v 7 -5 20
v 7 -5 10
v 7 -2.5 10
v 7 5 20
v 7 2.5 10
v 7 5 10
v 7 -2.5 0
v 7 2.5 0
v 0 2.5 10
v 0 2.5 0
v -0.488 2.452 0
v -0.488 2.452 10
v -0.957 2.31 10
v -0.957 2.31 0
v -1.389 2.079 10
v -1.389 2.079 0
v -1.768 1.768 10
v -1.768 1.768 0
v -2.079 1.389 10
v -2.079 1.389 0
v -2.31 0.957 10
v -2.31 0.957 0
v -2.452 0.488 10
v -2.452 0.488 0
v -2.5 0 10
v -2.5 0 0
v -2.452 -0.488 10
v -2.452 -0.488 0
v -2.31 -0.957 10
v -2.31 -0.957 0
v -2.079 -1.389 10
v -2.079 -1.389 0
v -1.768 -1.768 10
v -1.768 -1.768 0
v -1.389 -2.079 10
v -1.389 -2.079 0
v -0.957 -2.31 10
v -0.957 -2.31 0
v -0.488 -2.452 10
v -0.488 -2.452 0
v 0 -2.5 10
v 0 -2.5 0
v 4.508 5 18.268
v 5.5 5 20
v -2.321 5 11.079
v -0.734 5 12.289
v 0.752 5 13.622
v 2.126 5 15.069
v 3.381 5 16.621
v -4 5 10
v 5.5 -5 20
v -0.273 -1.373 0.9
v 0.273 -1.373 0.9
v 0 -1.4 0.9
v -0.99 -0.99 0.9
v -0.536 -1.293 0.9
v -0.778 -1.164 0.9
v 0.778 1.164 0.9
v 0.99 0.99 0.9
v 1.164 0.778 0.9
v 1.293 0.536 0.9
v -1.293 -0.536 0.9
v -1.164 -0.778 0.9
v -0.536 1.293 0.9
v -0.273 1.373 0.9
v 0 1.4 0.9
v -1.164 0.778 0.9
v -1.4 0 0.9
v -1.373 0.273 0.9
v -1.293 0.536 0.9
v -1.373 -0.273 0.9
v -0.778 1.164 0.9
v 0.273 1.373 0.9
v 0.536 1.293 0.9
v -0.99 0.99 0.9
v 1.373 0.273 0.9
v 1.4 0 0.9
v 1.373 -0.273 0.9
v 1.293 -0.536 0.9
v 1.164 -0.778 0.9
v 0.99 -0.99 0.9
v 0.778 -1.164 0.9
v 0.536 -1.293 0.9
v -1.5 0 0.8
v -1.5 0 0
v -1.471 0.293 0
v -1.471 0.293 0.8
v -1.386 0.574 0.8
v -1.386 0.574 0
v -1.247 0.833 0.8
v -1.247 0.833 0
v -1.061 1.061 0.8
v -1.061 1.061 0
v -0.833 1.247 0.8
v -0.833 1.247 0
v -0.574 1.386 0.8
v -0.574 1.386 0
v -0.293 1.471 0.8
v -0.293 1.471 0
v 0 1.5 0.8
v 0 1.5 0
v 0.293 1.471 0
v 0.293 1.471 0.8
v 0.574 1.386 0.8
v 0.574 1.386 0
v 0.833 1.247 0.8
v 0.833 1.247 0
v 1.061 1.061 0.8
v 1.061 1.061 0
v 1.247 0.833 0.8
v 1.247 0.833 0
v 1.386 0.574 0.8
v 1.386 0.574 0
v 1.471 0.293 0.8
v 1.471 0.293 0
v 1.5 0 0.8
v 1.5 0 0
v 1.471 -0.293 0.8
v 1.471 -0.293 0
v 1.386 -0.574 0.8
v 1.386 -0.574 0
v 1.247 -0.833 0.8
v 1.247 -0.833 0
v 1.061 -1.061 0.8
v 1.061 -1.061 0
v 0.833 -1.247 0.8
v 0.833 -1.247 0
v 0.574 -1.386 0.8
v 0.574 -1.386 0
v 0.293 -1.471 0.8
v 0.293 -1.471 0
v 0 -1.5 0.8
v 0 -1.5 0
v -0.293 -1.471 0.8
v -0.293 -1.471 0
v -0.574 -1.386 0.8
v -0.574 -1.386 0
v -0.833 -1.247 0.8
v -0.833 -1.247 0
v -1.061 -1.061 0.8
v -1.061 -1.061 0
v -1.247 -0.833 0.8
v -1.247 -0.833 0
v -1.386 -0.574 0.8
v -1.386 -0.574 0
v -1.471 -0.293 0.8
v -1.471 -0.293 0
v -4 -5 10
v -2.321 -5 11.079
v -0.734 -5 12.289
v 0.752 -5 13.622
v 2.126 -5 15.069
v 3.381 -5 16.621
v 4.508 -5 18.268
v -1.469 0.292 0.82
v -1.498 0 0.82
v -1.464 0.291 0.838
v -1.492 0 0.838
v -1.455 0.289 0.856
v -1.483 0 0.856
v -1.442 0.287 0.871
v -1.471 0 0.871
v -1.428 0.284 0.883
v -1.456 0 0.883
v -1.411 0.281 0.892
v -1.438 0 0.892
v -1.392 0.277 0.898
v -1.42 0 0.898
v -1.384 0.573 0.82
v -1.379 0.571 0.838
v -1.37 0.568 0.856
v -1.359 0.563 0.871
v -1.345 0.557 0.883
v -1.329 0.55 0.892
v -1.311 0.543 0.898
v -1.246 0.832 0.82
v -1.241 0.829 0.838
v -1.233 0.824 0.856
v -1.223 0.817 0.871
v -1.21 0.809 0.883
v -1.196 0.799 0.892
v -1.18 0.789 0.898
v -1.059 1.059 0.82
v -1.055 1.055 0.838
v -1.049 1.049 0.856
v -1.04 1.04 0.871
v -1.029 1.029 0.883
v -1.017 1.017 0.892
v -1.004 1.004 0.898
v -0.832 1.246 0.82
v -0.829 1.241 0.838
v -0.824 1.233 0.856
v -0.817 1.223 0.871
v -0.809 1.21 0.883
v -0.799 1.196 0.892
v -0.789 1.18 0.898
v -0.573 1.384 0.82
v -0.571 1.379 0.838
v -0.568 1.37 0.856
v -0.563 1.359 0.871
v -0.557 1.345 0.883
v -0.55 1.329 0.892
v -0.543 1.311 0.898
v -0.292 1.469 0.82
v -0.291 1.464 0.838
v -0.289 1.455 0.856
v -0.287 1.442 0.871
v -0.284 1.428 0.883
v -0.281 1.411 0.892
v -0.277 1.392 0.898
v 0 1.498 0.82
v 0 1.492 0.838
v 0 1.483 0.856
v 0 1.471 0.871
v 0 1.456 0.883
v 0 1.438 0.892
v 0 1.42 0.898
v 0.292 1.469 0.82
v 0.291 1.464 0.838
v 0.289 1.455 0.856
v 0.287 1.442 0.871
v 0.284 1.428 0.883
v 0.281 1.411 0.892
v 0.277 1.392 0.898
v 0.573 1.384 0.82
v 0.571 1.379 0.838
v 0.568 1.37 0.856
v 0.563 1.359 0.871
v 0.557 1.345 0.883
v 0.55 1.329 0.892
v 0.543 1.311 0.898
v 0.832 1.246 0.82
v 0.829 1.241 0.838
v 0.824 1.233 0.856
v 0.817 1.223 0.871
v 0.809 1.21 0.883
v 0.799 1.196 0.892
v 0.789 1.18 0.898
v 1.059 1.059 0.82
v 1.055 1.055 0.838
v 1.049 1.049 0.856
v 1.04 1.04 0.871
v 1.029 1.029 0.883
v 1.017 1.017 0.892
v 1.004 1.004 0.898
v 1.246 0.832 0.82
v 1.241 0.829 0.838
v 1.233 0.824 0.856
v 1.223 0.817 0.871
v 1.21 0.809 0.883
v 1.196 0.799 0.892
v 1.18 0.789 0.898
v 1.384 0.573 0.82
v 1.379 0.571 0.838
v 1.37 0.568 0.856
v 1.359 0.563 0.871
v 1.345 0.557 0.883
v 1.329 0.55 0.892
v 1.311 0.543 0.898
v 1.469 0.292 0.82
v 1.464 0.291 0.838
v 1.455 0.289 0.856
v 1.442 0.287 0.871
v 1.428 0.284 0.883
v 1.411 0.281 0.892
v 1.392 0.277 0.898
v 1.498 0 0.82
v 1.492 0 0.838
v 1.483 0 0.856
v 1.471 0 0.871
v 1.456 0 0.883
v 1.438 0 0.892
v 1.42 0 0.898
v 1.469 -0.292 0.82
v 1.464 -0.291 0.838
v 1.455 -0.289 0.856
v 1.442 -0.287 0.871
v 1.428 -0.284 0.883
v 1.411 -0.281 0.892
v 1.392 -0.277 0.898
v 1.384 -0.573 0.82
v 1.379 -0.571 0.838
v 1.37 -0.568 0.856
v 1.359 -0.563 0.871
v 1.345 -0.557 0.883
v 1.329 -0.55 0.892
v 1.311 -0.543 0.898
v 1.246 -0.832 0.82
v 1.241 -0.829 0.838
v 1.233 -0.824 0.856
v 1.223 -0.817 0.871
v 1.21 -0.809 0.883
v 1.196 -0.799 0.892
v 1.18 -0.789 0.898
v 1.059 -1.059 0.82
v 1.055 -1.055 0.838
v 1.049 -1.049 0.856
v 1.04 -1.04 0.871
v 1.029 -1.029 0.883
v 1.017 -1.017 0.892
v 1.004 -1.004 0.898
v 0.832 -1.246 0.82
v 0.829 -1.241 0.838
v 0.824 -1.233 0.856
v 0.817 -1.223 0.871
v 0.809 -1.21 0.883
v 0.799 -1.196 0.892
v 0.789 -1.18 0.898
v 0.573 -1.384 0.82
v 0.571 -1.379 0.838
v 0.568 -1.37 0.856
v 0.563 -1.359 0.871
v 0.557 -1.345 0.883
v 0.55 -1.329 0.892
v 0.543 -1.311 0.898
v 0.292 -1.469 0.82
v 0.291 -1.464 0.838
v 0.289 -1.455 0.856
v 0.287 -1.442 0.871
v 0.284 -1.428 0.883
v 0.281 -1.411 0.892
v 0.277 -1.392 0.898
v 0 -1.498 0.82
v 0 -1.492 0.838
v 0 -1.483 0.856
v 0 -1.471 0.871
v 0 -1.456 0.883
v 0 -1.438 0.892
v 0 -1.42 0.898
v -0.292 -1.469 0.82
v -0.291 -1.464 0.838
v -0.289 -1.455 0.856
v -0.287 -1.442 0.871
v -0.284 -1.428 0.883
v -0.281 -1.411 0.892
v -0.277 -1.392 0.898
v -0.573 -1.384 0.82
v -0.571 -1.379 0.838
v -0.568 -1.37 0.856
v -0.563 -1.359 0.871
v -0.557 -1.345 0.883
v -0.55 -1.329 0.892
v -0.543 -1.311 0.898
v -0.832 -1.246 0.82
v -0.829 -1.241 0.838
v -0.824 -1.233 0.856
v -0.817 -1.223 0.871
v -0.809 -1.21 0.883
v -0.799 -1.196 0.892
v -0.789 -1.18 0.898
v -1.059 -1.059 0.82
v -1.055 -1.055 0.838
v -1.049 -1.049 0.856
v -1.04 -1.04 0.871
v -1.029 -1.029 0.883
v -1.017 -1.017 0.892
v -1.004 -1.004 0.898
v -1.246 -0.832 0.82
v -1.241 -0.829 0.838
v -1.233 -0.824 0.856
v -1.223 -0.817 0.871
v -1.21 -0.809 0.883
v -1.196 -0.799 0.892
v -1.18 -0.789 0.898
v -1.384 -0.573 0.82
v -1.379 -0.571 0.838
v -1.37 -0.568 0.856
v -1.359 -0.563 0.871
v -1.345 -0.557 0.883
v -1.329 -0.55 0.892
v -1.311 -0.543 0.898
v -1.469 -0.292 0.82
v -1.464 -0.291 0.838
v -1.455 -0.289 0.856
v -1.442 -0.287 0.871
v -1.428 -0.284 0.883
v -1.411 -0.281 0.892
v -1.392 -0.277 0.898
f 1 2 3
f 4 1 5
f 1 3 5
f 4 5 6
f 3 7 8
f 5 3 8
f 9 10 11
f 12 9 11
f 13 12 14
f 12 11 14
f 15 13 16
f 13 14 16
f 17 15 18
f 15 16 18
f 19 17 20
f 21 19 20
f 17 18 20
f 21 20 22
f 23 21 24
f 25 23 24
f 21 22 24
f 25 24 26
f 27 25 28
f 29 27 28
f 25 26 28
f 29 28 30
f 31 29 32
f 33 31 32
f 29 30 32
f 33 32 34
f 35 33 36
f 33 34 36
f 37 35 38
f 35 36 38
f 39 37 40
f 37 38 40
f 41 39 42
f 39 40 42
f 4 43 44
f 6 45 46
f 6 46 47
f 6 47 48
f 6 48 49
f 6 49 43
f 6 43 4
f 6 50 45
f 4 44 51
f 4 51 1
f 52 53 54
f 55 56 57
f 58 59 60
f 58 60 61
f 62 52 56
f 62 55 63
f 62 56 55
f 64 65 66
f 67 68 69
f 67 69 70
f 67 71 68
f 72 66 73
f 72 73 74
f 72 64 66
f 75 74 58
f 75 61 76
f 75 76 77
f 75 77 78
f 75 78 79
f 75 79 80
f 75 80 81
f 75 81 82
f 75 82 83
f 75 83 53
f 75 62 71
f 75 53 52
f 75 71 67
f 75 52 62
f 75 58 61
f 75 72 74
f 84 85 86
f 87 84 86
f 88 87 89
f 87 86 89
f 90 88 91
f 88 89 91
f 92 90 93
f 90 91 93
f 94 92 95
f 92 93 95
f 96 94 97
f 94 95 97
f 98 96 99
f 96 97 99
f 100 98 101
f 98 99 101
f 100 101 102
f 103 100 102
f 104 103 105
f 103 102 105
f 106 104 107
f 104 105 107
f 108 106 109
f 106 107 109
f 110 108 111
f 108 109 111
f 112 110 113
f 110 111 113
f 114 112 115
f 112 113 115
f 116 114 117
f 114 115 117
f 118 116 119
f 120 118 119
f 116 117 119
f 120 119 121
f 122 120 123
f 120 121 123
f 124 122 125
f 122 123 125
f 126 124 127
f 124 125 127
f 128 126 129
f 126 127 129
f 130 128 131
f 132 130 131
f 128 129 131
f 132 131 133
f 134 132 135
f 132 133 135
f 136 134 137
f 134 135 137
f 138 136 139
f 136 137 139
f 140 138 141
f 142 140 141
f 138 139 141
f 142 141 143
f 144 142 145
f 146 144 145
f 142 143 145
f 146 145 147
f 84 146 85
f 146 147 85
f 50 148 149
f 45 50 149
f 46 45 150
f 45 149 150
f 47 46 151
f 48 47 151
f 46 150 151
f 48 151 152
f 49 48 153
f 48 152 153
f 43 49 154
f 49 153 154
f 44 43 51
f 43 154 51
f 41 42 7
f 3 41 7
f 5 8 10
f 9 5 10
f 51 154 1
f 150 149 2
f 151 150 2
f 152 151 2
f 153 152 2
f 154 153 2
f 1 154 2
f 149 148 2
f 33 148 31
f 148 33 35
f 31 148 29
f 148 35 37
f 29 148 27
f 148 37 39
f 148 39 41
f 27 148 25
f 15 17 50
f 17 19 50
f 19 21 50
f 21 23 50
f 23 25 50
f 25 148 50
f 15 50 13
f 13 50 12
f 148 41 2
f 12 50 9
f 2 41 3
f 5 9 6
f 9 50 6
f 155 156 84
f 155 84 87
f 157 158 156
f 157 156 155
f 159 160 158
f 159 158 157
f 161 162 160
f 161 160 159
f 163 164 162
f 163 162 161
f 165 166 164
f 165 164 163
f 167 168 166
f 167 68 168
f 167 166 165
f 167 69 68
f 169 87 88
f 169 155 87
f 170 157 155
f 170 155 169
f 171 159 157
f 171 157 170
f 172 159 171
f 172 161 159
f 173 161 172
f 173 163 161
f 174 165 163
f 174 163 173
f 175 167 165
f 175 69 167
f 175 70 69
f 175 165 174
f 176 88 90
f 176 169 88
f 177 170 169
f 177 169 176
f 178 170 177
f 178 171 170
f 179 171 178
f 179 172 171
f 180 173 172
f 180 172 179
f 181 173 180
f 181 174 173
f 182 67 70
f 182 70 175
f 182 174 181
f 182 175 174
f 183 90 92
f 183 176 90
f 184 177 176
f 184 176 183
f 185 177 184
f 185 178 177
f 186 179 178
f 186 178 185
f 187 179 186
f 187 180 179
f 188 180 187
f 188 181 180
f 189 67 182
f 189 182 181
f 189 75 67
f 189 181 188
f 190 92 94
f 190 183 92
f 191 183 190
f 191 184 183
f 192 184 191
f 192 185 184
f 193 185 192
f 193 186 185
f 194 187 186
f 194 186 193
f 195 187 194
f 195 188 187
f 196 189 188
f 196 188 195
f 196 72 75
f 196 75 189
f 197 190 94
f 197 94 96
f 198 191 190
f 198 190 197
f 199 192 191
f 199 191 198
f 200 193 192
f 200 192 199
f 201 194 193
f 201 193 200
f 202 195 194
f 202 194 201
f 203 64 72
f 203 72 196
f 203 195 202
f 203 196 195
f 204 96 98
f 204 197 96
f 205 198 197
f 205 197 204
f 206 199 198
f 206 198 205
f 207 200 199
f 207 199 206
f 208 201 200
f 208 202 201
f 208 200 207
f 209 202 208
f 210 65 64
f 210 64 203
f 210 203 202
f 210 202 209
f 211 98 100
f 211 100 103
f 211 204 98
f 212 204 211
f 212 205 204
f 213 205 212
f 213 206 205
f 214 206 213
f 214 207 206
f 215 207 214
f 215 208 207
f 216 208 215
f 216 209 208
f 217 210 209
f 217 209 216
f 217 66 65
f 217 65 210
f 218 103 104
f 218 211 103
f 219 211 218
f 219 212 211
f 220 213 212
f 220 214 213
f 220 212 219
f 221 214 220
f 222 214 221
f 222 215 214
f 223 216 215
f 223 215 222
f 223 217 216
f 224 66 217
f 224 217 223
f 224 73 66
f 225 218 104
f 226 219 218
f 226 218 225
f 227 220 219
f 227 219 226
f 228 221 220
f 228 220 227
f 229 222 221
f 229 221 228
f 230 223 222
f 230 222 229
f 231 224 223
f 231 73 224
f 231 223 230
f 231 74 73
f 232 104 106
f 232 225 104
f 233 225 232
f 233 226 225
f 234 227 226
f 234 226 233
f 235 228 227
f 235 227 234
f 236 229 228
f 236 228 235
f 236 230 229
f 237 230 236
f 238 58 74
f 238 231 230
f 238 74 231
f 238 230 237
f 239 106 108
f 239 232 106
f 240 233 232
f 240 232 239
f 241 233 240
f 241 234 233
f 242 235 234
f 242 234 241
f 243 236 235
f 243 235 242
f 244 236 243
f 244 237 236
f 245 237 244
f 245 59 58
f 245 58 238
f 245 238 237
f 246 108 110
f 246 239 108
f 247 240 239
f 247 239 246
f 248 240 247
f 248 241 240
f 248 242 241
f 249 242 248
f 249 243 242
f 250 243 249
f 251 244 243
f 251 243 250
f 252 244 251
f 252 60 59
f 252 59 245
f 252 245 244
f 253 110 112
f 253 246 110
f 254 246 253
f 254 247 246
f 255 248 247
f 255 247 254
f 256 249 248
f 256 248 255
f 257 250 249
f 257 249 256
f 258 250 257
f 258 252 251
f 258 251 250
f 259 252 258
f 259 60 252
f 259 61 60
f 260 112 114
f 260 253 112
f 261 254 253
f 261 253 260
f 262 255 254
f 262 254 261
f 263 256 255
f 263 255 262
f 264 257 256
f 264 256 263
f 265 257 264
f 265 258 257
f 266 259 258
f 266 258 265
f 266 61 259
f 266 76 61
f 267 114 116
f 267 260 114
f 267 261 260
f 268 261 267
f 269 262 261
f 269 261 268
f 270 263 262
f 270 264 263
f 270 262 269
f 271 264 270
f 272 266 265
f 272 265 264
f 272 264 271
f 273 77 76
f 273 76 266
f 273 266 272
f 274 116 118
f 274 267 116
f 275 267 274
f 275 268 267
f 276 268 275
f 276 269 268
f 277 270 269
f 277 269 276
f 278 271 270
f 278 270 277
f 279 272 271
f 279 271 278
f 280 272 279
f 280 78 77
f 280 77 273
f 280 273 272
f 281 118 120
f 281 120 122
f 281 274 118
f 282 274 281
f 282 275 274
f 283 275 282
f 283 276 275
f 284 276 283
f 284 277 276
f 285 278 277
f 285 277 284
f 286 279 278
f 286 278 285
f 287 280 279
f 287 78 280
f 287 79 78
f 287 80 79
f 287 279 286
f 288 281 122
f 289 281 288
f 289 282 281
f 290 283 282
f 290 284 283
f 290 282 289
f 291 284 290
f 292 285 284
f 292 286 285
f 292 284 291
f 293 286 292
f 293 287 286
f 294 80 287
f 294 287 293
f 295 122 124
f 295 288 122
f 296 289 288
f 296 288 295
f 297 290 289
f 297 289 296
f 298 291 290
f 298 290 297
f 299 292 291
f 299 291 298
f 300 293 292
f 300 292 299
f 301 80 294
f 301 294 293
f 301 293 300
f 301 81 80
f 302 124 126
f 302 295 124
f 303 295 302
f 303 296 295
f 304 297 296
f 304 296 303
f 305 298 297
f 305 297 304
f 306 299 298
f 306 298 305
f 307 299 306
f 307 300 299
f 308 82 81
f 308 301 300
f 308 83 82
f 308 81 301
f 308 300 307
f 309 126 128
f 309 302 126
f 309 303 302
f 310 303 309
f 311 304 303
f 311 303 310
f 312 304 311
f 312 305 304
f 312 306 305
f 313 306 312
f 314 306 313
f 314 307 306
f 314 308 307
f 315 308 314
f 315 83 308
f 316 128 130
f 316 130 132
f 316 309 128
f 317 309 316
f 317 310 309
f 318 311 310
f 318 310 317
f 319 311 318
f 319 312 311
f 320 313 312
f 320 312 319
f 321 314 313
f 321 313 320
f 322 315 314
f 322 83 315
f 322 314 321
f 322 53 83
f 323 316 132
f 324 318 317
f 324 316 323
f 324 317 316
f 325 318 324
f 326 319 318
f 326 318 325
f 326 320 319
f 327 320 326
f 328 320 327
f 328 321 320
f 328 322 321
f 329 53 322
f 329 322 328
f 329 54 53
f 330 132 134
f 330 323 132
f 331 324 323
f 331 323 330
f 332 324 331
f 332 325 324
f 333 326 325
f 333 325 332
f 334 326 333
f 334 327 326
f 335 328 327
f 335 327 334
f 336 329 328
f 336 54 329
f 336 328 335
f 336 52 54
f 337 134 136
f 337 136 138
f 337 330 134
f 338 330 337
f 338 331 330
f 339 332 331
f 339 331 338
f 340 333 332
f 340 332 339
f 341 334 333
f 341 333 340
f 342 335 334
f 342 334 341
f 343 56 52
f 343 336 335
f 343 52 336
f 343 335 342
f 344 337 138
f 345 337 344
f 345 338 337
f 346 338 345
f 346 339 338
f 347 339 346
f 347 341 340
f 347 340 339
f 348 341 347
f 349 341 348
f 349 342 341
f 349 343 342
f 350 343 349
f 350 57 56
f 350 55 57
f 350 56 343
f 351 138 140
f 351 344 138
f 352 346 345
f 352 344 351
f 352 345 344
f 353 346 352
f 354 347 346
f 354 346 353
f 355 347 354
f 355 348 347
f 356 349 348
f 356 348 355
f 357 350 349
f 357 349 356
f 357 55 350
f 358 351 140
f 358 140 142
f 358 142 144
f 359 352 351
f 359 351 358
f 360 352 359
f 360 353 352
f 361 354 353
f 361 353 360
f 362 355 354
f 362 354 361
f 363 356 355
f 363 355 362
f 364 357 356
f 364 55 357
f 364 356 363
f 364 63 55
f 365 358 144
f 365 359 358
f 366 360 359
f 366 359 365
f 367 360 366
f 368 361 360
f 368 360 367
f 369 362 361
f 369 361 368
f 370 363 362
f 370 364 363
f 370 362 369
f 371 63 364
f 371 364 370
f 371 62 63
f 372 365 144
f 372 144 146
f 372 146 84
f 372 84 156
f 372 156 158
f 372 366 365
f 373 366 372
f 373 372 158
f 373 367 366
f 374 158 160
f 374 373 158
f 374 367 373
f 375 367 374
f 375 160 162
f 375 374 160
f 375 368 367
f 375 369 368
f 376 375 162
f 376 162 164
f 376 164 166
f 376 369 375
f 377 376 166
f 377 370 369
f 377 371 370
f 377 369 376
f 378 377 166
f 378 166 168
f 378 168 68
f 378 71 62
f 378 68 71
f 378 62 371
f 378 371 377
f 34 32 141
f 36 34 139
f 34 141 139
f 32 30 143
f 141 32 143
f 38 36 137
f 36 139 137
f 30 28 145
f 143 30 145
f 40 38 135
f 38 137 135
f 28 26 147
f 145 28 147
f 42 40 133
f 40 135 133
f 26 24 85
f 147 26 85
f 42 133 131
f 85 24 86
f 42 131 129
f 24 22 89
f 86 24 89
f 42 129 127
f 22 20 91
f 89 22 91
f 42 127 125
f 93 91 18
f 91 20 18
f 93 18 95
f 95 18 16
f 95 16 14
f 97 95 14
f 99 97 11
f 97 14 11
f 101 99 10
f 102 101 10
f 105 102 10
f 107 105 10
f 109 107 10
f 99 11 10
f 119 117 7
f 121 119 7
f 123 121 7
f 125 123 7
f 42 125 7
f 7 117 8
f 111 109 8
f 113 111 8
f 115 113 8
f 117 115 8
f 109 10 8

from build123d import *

# Parameters (mm, degrees)
CROQUIS1_R              = 2.5
SALIENTE_EXTRUIR1_DEPTH = 10
CROQUIS2_R              = 1.5
CORTAR_EXTRUIR1_DEPTH   = 0.9
REDONDEO1_R             = 0.1
CROQUIS3_W              = 11
CROQUIS3_H              = 10
SALIENTE_EXTRUIR2_DEPTH = 10
CORTAR_EXTRUIR2_DEPTH   = 24.430749028
SALIENTE_EXTRUIR3_DEPTH = 10


with BuildPart() as part:
    # Croquis1 → Saliente-Extruir1 (new body)
    with BuildSketch(Plane.XY):
        Circle(CROQUIS1_R)
    extrude(amount=SALIENTE_EXTRUIR1_DEPTH)

    # Croquis2 → Cortar-Extruir1 (cut)
    with BuildSketch(Plane(origin=(0, 0, 0), x_dir=(-1, 0, 0), z_dir=(0, 0, -1))):
        Circle(CROQUIS2_R)
    extrude(amount=-CORTAR_EXTRUIR1_DEPTH, mode=Mode.SUBTRACT)

    # Redondeo1
    redondeo1_edges = [part.edges().sort_by_distance(p)[0] for p in [
        (1.5, 0, 0.9),
    ]]
    fillet(redondeo1_edges, radius=REDONDEO1_R)

    # Croquis3 → Saliente-Extruir2 (add)
    with BuildSketch(Plane.XY.offset(10)):
        with Locations((1.5, 0)):
            Rectangle(CROQUIS3_W, CROQUIS3_H)
    extrude(amount=SALIENTE_EXTRUIR2_DEPTH)

    # Croquis4 → Cortar-Extruir2 (cut, through all)
    with BuildSketch(Plane.XZ.offset(5)):
        with BuildLine():
            Line((-4, 20), (-4, 10))
            ThreePointArc((-4, 10), (1.453300741, 14.331864296), (5.5, 20))
            Line((5.5, 20), (-4, 20))
        make_face()
    extrude(amount=-CORTAR_EXTRUIR2_DEPTH, mode=Mode.SUBTRACT)

    # Croquis5 → Saliente-Extruir3 (add)
    with BuildSketch(Plane(origin=(0, 0, 0), x_dir=(-1, 0, 0), z_dir=(0, 0, -1))):
        with BuildLine():
            Line((0, -2.5), (-7, -2.5))
            Line((-7, -2.5), (-7, 2.5))
            Line((-7, 2.5), (0, 2.5))
            ThreePointArc((0, 2.5), (-2.5, 0), (0, -2.5))
        make_face()
    extrude(amount=-SALIENTE_EXTRUIR3_DEPTH)


solid = part.part
